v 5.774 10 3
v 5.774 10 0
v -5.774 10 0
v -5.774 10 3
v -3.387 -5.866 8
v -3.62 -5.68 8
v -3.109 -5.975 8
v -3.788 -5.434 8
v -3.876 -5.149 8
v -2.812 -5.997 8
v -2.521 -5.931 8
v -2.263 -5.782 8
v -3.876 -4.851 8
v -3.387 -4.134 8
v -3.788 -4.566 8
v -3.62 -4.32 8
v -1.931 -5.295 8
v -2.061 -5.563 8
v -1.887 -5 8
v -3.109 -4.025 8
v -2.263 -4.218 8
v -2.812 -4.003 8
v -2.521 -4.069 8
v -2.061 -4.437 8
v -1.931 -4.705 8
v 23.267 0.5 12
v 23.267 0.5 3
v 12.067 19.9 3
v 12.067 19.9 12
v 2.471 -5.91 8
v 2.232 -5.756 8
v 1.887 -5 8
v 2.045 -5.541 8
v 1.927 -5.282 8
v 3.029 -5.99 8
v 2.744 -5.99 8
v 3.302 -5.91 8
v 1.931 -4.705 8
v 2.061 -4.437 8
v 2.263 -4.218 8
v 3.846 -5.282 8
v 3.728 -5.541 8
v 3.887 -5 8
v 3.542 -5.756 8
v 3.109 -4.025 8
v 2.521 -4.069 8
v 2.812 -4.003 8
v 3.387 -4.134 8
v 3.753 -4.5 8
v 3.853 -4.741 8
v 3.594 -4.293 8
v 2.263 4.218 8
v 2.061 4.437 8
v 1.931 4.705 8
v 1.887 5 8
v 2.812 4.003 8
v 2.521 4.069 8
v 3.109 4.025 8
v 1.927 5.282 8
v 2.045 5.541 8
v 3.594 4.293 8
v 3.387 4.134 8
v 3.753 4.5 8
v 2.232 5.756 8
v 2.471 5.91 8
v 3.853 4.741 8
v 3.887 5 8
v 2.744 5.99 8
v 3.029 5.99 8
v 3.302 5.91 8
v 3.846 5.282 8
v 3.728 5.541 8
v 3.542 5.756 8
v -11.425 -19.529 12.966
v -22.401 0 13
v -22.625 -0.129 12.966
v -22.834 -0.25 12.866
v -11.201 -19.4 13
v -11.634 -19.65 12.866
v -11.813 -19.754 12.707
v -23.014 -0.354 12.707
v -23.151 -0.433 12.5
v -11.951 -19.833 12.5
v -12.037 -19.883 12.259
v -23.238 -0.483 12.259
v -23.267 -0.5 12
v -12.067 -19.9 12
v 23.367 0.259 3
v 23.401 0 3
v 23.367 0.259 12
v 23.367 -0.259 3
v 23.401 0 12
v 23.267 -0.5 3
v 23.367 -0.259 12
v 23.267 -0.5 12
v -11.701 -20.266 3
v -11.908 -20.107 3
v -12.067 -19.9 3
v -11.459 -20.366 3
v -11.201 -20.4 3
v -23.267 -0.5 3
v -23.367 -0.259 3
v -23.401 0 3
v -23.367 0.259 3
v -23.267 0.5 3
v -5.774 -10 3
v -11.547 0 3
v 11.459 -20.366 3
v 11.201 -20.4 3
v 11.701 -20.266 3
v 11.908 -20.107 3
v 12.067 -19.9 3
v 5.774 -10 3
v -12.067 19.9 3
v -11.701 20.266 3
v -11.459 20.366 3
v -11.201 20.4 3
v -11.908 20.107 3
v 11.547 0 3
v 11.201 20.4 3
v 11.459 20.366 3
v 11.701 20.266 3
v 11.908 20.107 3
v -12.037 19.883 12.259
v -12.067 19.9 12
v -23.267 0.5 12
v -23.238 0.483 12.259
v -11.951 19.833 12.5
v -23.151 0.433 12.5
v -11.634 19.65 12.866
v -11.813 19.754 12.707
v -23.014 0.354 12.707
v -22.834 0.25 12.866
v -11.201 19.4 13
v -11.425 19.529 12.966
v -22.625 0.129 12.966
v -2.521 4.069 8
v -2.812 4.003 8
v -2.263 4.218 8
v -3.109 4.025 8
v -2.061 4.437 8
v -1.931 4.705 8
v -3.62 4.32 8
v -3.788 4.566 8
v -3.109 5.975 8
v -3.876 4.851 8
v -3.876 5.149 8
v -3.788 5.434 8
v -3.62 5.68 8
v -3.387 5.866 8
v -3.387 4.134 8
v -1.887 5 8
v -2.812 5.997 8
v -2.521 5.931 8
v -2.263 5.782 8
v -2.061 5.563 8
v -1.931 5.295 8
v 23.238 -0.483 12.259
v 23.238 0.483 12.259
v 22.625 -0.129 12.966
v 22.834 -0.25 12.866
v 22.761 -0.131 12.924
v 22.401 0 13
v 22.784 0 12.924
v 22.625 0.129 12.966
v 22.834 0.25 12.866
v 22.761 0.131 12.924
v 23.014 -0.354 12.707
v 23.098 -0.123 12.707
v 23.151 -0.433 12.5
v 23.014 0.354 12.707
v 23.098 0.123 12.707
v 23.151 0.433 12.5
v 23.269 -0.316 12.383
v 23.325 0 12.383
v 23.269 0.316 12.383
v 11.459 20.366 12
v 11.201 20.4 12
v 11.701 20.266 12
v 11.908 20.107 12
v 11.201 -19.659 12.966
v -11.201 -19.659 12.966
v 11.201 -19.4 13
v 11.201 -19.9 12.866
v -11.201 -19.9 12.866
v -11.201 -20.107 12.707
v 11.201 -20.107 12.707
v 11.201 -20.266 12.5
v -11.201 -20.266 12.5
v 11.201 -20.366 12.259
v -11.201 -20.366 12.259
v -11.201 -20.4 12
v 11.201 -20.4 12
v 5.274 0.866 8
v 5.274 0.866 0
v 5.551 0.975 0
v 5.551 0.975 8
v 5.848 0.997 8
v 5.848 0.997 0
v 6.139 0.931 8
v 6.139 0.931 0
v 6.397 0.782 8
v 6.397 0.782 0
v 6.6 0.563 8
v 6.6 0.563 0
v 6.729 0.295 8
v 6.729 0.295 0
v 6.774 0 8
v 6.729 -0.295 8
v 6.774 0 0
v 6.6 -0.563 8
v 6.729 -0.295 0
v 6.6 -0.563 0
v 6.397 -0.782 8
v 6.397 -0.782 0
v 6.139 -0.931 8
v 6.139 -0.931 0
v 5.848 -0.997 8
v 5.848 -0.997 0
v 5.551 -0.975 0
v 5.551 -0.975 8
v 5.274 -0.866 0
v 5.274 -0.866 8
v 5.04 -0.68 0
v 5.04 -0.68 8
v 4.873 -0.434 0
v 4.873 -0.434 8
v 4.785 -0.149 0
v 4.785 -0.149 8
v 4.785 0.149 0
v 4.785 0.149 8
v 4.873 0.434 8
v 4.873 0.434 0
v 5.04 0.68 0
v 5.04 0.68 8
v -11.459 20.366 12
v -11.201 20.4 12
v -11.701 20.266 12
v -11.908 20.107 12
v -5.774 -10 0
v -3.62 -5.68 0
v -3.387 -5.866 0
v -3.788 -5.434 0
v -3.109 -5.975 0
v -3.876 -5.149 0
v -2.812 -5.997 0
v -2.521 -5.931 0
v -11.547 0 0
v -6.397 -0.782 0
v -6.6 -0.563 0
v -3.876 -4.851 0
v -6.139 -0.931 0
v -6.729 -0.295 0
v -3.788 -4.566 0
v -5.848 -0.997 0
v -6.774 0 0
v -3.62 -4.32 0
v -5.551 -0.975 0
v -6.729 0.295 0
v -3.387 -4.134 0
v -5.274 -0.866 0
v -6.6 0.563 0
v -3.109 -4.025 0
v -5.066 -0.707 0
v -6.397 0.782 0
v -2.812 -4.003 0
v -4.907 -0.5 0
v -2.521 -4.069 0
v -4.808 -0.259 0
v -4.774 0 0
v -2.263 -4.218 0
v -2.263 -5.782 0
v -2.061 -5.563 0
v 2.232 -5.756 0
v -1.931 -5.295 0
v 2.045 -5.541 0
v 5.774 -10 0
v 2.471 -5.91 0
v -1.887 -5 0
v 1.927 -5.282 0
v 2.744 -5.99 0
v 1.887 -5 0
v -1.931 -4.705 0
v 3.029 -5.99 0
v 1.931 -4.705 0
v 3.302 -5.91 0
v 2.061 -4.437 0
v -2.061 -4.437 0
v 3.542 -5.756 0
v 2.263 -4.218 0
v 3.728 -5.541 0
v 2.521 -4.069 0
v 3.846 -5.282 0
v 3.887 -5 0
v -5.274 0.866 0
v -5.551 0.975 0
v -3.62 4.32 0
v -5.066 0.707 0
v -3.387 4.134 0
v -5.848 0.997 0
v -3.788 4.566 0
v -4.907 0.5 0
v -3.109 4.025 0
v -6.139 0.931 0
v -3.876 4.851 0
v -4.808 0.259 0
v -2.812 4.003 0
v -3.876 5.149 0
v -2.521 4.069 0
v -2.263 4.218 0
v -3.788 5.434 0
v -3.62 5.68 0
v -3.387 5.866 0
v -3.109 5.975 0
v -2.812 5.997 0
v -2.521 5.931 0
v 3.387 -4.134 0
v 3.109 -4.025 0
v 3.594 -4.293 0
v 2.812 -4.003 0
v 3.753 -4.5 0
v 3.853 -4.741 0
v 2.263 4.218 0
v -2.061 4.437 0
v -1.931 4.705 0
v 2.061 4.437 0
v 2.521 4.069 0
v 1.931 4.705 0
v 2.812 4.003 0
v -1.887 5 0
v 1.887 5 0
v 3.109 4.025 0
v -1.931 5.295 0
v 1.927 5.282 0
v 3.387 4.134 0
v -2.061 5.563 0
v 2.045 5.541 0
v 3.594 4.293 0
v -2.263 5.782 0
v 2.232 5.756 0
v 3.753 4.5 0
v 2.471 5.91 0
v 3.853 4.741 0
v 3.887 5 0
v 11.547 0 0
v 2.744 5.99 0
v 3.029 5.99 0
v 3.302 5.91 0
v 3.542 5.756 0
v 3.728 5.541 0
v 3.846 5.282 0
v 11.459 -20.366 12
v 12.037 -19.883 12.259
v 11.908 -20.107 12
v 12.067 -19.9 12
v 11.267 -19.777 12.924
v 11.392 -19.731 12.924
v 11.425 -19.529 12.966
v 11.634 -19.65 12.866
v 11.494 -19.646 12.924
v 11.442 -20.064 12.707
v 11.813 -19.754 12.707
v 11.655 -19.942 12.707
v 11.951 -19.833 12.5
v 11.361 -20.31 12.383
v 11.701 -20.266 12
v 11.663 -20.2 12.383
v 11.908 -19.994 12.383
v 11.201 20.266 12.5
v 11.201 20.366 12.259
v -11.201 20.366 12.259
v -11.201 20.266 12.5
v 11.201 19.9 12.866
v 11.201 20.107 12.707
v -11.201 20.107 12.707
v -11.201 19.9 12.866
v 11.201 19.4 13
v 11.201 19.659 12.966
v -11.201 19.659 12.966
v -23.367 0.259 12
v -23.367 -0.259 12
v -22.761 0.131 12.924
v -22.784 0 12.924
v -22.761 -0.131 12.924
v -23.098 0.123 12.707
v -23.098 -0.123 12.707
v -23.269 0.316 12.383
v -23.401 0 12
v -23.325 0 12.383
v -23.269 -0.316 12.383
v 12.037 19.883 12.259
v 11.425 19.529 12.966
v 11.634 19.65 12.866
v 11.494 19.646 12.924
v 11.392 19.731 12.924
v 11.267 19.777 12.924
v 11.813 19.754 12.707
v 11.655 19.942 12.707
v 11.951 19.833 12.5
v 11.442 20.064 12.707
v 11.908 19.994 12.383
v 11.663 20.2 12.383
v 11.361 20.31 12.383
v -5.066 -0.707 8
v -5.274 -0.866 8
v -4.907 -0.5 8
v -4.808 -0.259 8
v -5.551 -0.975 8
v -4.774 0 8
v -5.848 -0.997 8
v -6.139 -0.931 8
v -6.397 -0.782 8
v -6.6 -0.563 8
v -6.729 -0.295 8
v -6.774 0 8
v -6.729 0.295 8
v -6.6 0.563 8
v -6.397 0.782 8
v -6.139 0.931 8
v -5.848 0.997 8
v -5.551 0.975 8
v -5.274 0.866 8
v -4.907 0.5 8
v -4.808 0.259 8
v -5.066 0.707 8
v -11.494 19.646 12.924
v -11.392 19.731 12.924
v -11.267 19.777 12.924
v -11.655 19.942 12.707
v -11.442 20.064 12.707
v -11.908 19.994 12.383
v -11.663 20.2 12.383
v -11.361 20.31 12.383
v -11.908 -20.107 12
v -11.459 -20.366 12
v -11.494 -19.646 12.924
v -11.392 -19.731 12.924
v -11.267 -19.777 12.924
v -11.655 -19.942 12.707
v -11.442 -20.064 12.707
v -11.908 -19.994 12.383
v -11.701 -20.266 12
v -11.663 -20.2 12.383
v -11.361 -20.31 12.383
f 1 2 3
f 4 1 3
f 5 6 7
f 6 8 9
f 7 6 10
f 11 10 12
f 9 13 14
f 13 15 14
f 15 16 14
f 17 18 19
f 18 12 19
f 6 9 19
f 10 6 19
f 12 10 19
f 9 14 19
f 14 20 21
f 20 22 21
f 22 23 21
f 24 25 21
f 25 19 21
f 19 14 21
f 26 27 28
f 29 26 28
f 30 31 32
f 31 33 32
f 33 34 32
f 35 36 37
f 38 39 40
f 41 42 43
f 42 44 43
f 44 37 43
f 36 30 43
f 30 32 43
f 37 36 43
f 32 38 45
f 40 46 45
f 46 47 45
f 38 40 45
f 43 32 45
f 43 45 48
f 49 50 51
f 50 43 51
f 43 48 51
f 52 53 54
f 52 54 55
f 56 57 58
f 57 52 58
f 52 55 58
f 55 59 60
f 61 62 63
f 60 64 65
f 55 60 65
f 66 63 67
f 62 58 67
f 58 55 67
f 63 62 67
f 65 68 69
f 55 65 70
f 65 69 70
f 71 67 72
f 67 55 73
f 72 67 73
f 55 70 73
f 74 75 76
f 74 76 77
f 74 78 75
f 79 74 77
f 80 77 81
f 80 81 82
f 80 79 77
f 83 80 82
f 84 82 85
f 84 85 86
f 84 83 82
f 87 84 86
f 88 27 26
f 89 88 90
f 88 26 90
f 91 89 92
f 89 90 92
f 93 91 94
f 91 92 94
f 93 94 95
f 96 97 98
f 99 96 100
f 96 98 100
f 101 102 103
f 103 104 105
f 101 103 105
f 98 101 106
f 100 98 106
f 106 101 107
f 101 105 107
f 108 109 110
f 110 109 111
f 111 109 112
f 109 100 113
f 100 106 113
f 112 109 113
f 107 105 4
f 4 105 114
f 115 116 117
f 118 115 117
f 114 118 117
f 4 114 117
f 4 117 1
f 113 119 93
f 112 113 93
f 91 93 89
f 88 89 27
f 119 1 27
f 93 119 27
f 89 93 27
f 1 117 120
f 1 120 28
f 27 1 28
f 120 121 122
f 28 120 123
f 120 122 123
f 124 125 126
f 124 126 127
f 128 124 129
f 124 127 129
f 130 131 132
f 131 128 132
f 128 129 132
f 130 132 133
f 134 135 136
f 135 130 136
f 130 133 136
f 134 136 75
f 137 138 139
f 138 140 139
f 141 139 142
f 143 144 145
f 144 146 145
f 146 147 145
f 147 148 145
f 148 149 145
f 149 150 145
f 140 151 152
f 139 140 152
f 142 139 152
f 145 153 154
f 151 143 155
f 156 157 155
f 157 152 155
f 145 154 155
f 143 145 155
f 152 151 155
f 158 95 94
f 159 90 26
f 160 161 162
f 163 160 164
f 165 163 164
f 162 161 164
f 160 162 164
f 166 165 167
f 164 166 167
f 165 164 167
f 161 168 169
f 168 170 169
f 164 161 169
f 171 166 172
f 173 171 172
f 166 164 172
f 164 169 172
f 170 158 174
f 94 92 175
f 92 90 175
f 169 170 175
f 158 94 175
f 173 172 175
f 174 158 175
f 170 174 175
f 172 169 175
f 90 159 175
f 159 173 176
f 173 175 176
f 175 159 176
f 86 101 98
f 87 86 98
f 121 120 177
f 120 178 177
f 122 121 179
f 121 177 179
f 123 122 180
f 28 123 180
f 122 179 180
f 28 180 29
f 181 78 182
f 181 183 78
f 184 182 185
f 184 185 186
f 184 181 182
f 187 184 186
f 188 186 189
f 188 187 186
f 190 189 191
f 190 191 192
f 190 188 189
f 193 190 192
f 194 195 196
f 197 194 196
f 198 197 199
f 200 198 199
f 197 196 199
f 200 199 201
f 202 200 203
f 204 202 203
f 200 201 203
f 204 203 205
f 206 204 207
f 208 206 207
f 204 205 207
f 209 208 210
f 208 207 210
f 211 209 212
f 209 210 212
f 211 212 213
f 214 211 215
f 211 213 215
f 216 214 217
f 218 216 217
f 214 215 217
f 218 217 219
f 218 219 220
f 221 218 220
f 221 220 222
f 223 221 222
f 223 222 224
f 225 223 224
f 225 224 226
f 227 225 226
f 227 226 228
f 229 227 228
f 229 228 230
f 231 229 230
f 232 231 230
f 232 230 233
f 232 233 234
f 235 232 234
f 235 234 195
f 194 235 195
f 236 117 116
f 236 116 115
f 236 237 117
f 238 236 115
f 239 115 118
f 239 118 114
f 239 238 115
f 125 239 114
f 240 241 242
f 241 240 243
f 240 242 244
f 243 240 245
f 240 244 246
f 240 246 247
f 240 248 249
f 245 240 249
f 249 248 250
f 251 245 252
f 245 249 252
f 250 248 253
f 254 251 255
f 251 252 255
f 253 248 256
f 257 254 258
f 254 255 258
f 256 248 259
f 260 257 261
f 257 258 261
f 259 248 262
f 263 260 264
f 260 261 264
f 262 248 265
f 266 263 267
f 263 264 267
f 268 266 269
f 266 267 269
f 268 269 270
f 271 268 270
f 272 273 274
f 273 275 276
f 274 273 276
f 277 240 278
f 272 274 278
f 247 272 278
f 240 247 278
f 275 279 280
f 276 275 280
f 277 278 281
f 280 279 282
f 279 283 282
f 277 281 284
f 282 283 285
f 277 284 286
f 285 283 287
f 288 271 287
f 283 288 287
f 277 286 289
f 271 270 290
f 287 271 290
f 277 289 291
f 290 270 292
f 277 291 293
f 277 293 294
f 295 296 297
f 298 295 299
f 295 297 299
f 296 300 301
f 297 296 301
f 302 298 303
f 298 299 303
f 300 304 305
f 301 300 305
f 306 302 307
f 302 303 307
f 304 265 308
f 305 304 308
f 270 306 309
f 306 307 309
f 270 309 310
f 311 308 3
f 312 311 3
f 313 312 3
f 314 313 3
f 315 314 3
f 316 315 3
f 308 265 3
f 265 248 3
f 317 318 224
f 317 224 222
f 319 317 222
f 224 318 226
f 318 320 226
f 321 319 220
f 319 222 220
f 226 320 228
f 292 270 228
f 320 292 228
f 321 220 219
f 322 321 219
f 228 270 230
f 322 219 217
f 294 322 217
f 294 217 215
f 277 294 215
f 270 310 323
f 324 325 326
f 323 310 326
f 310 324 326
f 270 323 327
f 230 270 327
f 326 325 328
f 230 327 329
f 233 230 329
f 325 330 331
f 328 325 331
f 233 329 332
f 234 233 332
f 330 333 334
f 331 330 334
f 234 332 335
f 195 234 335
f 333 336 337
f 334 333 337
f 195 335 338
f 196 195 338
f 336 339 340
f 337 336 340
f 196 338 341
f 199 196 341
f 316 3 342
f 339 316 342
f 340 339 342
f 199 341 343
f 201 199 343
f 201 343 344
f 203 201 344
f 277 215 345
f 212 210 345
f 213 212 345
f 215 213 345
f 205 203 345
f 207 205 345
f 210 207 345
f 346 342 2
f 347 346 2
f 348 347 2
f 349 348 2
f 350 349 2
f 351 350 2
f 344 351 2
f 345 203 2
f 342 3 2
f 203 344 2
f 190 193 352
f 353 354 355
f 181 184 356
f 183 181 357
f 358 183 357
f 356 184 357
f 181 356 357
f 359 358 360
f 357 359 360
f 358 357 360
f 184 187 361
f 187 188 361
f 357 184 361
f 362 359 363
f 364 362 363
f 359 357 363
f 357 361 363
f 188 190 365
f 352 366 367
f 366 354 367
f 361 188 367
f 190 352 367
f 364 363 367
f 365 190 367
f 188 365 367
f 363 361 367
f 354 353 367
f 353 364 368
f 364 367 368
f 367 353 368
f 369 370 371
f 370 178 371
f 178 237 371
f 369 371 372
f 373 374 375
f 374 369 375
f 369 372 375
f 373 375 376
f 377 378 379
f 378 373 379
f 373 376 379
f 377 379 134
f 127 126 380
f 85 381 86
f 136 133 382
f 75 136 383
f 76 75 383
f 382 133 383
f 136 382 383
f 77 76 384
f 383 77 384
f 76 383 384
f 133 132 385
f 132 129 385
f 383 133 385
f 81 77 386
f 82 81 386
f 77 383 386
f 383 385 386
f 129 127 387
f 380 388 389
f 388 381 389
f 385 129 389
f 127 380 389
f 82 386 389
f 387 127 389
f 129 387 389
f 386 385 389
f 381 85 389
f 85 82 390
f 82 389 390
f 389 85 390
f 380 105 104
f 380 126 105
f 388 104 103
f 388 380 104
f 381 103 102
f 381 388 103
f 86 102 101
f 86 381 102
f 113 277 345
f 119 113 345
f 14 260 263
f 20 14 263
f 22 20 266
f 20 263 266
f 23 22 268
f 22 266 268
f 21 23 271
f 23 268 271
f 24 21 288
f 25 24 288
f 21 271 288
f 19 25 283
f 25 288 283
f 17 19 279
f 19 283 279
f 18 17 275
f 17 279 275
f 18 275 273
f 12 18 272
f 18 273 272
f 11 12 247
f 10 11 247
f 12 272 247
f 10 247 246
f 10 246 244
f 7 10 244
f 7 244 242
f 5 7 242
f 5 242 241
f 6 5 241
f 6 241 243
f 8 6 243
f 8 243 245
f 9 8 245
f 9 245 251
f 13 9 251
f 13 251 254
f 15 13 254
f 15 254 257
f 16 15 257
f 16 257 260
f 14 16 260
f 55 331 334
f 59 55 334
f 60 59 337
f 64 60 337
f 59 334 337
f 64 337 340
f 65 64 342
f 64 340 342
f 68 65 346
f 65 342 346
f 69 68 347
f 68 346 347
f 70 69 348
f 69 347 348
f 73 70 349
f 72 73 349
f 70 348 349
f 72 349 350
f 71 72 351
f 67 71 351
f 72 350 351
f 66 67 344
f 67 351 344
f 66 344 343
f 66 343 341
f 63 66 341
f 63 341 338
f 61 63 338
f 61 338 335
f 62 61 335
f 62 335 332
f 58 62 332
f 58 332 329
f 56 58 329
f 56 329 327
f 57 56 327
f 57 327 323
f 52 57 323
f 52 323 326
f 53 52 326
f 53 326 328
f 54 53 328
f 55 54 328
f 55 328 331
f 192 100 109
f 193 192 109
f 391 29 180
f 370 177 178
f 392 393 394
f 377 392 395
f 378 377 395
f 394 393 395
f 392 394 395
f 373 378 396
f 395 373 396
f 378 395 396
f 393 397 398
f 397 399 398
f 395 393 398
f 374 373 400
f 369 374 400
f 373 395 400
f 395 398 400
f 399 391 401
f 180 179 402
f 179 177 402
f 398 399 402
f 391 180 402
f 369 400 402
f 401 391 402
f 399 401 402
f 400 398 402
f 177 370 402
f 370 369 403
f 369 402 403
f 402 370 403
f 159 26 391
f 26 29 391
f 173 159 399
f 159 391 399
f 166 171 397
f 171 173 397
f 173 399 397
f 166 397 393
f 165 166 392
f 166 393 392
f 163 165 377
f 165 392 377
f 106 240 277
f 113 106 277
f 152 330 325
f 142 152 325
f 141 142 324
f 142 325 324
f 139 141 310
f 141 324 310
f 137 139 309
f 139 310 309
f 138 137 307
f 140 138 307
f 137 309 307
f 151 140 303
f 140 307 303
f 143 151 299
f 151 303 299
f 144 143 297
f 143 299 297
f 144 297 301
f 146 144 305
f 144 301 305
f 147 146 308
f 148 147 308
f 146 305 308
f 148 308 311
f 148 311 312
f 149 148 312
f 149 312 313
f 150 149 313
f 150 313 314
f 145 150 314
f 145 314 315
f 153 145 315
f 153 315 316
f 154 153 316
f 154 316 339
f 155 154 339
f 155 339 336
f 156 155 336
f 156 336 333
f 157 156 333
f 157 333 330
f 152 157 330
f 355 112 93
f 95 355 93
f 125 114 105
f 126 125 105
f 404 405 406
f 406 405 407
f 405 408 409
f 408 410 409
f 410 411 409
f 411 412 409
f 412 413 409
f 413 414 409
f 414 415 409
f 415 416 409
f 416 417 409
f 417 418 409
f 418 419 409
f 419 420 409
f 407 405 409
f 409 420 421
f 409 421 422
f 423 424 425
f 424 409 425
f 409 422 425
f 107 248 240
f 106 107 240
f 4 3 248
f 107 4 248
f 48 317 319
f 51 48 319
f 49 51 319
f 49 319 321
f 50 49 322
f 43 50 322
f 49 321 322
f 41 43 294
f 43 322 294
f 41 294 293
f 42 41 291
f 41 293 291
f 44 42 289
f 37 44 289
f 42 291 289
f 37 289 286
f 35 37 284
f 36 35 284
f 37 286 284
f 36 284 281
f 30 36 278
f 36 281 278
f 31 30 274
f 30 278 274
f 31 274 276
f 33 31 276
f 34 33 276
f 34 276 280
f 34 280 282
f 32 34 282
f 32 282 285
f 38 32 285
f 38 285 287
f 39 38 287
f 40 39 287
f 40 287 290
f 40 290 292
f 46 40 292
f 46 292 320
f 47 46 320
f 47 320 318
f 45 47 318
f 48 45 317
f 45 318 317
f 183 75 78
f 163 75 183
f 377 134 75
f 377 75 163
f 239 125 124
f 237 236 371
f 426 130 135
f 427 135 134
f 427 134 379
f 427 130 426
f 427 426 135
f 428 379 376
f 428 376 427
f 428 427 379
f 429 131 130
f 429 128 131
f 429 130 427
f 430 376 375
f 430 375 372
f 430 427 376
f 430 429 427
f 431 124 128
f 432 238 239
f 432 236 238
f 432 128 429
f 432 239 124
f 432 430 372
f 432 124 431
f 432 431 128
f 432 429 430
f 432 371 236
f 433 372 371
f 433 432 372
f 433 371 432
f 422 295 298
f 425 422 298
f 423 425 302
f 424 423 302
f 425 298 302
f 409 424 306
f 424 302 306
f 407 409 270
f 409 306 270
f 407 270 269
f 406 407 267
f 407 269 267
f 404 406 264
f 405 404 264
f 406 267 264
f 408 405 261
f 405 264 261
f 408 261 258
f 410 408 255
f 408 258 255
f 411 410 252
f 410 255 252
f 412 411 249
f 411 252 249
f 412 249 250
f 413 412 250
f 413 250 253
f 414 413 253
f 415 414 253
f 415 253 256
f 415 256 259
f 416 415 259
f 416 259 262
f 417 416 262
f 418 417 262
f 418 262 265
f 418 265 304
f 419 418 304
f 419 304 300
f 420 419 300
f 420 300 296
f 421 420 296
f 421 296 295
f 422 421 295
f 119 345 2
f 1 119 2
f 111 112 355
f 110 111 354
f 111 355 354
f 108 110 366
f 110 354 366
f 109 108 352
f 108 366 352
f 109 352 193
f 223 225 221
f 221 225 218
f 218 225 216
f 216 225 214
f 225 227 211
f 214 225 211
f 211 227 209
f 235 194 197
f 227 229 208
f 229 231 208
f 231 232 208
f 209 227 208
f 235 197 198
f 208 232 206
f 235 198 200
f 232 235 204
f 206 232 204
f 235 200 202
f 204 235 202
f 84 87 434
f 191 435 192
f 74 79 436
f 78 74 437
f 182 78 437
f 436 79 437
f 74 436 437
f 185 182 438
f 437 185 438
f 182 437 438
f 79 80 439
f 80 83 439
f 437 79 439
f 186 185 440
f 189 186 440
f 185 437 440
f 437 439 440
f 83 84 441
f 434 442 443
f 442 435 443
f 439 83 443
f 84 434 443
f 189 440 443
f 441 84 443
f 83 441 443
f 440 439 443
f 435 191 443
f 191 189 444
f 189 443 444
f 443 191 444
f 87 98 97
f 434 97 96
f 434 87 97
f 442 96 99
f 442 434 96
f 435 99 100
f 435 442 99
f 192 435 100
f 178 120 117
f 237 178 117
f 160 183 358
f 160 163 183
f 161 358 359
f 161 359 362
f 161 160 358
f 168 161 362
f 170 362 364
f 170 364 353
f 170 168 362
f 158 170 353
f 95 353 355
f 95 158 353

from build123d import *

# Parameters (mm, degrees)
F1_DEPTH = 3
F3_DEPTH = 10
F4_R     = 1
F5_DEPTH = 5


with BuildPart() as f1:
    # F0 (on Top) → F1 (new body)
    with BuildSketch(Plane.XY):
        Polygon((5.7735026919, 10), (-5.7735026919, 10), (-11.5470053838, 0), (-5.7735026919, -10), (5.7735026919, -10), (11.5470053838, 0), align=None)
        with BuildLine():
            ThreePointArc((-3.3867513459, 4.1339745962), (-3.3867513459, 5.8660254038), (-1.8867513459, 5))
            Line((-1.8867513459, 5), (1.8867513459, 5))
            ThreePointArc((1.8867513459, 5), (2.8867513459, 6), (3.8867513459, 5))
            ThreePointArc((3.8867513459, 5), (3.7527767497, 4.5), (3.3867513459, 4.1339745962))
            Line((3.3867513459, 4.1339745962), (5.2735026919, 0.8660254038))
            ThreePointArc((5.2735026919, 0.8660254038), (6.2735026919, 0.8660254038), (6.7735026919, 0))
            ThreePointArc((6.7735026919, 0), (6.2735026919, -0.8660254038), (5.2735026919, -0.8660254038))
            Line((5.2735026919, -0.8660254038), (3.3867513459, -4.1339745962))
            ThreePointArc((3.3867513459, -4.1339745962), (3.7527767497, -4.5), (3.8867513459, -5))
            ThreePointArc((3.8867513459, -5), (2.8867513459, -6), (1.8867513459, -5))
            Line((1.8867513459, -5), (-1.8867513459, -5))
            ThreePointArc((-1.8867513459, -5), (-3.3867513459, -5.8660254038), (-3.3867513459, -4.1339745962))
            Line((-3.3867513459, -4.1339745962), (-5.2735026919, -0.8660254038))
            ThreePointArc((-5.2735026919, -0.8660254038), (-6.7735026919, 0), (-5.2735026919, 0.8660254038))
            Line((-5.2735026919, 0.8660254038), (-3.3867513459, 4.1339745962))
        make_face(mode=Mode.SUBTRACT)
        with BuildLine():
            Line((1.8867513459, 5), (-1.8867513459, 5))
            ThreePointArc((-1.8867513459, 5), (-2.3867513459, 4.1339745962), (-3.3867513459, 4.1339745962))
            Line((-3.3867513459, 4.1339745962), (-5.2735026919, 0.8660254038))
            ThreePointArc((-5.2735026919, 0.8660254038), (-4.9074772881, 0.5), (-4.7735026919, 0))
            ThreePointArc((-4.7735026919, 0), (-4.9074772881, -0.5), (-5.2735026919, -0.8660254038))
            Line((-5.2735026919, -0.8660254038), (-3.3867513459, -4.1339745962))
            ThreePointArc((-3.3867513459, -4.1339745962), (-2.3867513459, -4.1339745962), (-1.8867513459, -5))
            Line((-1.8867513459, -5), (1.8867513459, -5))
            ThreePointArc((1.8867513459, -5), (2.3867513459, -4.1339745962), (3.3867513459, -4.1339745962))
            Line((3.3867513459, -4.1339745962), (5.2735026919, -0.8660254038))
            ThreePointArc((5.2735026919, -0.8660254038), (4.7735026919, 0), (5.2735026919, 0.8660254038))
            Line((5.2735026919, 0.8660254038), (3.3867513459, 4.1339745962))
            ThreePointArc((3.3867513459, 4.1339745962), (2.3867513459, 4.1339745962), (1.8867513459, 5))
        make_face()
    extrude(amount=F1_DEPTH)

    # F2 (on face) → F3 (join)
    with BuildSketch(Plane.XY.offset(3)):
        Polygon((11.7779454915, 20.4), (-11.7779454915, 20.4), (-23.5558909829, 0), (-11.7779454915, -20.4), (11.7779454915, -20.4), (23.5558909829, 0), align=None)
        Polygon((5.7735026919, 10), (11.5470053838, 0), (5.7735026919, -10), (-5.7735026919, -10), (-11.5470053838, 0), (-5.7735026919, 10), align=None, mode=Mode.SUBTRACT)
        Polygon((11.7779454915, 20.4), (-11.7779454915, 20.4), (-23.5558909829, 0), (-11.7779454915, -20.4), (11.7779454915, -20.4), (23.5558909829, 0), align=None)
    extrude(amount=F3_DEPTH)

    # F4
    f4_edges = [f1.edges().sort_by_distance(p)[0] for p in [
        (-17.666918, 10.2, 13),
        (-17.666918, -10.2, 13),
        (0, -20.4, 13),
        (17.666918, -10.2, 13),
        (17.666918, 10.2, 13),
        (0, 20.4, 13),
        (-11.777945, 20.4, 8),
        (11.777945, 20.4, 8),
        (23.555891, 0, 8),
        (-23.555891, 0, 8),
        (11.777945, -20.4, 8),
        (-11.777945, -20.4, 8),
    ]]
    fillet(f4_edges, radius=F4_R)

    # F5 (cut): faces of the model
    f5_faces = [f1.faces().sort_by_distance(p)[0] for p in [
        (-2.8867513459, -5, 3),
        (2.8867513459, -5, 3),
        (5.7735026919, 0, 3),
        (2.8867513459, 5, 3),
        (-2.8867513459, 5, 3),
        (-5.7735026919, 0, 3),
    ]]
    extrude(f5_faces, amount=-F5_DEPTH, mode=Mode.SUBTRACT)


solid = f1.part
